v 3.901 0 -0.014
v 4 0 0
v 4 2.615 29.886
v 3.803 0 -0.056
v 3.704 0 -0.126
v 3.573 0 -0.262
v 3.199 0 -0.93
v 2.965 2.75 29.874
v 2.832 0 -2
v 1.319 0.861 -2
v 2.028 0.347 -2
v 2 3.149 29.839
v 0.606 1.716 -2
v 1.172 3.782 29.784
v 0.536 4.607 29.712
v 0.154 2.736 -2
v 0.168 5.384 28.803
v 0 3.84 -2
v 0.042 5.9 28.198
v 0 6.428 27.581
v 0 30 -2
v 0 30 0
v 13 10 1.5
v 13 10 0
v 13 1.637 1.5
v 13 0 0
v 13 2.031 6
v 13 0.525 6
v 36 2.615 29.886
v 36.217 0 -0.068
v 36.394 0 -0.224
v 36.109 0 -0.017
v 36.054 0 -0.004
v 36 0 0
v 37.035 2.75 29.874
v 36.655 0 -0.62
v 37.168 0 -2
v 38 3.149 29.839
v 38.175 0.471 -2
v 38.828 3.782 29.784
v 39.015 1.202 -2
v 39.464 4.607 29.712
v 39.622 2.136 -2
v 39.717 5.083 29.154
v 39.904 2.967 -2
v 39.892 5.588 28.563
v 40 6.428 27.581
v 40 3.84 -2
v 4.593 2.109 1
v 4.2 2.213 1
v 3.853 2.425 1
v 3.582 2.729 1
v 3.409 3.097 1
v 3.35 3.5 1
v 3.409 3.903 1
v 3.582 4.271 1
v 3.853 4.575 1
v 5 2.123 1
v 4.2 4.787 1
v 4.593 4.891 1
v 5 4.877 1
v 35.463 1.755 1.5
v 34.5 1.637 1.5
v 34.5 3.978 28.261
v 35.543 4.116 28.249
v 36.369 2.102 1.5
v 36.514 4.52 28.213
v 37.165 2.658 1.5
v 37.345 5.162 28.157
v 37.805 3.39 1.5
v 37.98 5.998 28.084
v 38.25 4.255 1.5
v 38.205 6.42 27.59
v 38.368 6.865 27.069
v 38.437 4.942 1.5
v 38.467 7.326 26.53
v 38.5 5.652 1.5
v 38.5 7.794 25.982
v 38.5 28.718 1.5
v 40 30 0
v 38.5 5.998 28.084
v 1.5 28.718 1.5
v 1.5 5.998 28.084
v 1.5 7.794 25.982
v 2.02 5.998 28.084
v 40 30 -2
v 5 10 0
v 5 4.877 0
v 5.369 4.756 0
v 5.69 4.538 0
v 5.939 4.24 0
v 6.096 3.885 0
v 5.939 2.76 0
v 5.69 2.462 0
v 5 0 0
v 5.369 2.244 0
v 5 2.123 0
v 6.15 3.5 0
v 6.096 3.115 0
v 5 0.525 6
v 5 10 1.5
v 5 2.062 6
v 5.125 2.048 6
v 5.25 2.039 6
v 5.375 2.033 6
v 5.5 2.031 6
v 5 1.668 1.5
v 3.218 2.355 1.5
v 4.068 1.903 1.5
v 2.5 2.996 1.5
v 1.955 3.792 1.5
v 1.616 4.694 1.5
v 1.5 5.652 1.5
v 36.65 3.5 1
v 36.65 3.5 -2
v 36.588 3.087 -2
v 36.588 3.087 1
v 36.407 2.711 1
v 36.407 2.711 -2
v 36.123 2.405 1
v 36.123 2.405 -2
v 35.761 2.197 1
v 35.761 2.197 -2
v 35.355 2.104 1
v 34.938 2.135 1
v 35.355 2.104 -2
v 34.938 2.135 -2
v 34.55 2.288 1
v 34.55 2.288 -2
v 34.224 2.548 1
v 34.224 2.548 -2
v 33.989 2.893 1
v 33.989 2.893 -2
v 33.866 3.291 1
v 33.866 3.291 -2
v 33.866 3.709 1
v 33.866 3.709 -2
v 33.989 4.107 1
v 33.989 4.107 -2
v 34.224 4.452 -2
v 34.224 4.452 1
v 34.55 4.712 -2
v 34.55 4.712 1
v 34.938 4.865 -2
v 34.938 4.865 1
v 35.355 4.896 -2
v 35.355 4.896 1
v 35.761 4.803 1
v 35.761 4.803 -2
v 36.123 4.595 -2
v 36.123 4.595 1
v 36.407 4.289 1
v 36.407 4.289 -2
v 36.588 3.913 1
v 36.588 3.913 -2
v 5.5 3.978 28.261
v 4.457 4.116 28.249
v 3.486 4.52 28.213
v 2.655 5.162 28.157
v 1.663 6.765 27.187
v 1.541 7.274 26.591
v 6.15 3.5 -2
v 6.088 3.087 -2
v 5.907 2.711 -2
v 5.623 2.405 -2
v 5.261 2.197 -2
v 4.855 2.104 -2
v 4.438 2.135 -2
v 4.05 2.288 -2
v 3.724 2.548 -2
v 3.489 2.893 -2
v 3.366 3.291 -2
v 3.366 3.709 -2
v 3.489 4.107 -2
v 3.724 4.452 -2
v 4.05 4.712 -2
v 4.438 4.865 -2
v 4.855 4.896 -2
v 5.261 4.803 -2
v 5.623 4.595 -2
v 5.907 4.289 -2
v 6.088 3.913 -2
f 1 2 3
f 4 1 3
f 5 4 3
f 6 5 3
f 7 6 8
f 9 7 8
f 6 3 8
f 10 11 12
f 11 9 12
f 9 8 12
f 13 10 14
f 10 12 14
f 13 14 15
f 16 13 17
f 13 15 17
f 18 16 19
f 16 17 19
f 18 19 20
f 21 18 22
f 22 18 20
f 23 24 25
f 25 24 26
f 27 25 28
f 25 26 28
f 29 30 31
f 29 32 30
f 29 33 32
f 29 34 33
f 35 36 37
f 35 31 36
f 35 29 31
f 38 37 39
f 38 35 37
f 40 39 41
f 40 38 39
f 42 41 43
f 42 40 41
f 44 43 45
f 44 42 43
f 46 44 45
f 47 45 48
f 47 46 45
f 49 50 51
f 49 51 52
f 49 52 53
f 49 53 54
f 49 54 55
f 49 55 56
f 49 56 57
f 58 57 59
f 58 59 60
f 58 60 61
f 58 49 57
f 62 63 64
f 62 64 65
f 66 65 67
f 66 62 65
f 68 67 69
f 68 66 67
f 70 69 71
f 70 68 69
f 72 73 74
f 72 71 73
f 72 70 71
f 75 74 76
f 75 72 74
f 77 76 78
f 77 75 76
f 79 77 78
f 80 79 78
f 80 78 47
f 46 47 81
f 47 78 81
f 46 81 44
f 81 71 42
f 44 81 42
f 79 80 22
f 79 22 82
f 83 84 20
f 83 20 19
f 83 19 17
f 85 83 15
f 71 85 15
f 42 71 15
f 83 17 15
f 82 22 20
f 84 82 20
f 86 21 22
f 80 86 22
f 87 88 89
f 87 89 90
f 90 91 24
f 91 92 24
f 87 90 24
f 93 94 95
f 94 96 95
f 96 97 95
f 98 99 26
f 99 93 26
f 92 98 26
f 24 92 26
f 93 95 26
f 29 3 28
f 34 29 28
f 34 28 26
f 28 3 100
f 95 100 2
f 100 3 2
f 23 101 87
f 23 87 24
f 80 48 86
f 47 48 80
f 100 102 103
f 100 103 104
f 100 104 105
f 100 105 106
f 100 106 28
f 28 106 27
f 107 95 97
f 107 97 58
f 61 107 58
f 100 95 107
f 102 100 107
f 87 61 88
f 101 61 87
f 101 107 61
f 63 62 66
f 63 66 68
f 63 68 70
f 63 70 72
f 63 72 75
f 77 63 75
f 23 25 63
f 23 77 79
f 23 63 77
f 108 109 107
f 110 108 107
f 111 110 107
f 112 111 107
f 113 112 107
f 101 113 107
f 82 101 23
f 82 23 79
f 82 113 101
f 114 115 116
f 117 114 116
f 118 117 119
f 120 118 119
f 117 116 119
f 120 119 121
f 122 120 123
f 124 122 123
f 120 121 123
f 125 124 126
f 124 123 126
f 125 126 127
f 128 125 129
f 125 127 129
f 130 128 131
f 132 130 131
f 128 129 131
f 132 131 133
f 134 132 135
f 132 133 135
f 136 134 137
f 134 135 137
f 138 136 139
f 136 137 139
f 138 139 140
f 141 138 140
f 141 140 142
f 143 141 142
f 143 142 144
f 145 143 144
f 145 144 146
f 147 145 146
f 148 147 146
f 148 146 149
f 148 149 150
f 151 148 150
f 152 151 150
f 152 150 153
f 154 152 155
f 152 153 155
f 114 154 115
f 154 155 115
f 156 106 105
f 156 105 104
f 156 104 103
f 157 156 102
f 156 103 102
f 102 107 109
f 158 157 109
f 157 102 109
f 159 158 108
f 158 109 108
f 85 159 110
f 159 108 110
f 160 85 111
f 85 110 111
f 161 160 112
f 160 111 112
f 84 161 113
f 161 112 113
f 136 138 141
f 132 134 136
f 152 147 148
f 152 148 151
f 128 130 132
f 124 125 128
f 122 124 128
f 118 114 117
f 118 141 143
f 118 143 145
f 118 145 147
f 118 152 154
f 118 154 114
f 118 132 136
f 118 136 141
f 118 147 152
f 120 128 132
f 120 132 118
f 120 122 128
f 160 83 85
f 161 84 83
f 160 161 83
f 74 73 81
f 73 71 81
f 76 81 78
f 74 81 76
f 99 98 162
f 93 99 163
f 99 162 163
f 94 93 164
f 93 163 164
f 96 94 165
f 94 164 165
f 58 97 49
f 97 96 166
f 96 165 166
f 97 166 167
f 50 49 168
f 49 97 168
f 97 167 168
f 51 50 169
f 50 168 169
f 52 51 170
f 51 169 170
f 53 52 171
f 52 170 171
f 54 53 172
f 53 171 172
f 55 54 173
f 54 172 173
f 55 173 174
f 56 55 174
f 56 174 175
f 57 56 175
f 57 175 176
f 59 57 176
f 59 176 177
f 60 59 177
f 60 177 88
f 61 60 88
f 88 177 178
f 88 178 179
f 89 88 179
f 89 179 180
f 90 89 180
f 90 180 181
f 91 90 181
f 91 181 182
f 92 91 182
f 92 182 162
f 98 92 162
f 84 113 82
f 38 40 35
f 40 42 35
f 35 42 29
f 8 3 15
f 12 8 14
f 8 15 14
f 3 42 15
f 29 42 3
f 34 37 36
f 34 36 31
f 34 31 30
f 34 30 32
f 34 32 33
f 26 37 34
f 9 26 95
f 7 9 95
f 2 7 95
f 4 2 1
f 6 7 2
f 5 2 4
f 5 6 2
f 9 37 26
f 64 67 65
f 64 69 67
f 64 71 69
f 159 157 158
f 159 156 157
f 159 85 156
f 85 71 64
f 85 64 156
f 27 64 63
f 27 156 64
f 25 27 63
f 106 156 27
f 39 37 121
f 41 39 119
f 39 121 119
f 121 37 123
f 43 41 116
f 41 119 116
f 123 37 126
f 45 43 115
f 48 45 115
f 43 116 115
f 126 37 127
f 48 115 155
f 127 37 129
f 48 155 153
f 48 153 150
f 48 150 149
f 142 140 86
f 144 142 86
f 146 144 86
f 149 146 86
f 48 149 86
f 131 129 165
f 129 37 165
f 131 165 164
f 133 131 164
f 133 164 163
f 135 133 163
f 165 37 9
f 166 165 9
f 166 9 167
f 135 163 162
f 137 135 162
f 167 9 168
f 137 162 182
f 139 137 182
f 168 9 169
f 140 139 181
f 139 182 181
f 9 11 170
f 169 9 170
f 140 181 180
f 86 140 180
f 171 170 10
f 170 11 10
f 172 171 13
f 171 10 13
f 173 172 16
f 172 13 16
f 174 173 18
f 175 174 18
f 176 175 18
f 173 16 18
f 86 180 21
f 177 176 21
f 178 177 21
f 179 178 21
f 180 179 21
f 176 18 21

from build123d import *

# Parameters (mm, degrees)
F1_DEPTH     = 40
F2_T         = -1.5
F0_W         = 30
F0_H         = 2
F3_DEPTH     = 40
F4_W         = 8
F4_H         = 6
F5_DEPTH     = 10
F6_R         = 1.4
F7_DEPTH     = 3
F8_T4_DEPTH  = 36.8630372484
F8_T11_DEPTH = 36.8630372484
F8_T17_DEPTH = 36.8630372484
F8_T20_DEPTH = 90


# Not quite as in the source:
# - a fillet or chamfer that OpenCascade refuses, or shapes differently, is made with other operations: its cross-section is extruded or revolved along the edge and cut away or added


with BuildPart() as f1:
    # F0 (on Right) → F1 (new body)
    with BuildSketch(Plane.YZ):
        Polygon((2.6146722824, 29.8858409428), (0, 0), (30, 0), (4.6070616786, 29.7115294573), align=None)
    extrude(amount=F1_DEPTH)

    # F2
    f2_openings = [f1.faces().sort_by_distance(p)[0] for p in [
        (20, 17.303531, 14.855765),
    ]]
    offset(amount=F2_T, openings=f2_openings)

    # F0 (on Right) → F3 (join)
    with BuildSketch(Plane.YZ):
        with Locations((15, -1)):
            Rectangle(F0_W, F0_H)
    extrude(amount=F3_DEPTH)

    # F4 (on Front) → F5 (cut)
    with BuildSketch(Plane.XZ):
        with Locations((9, 3)):
            Rectangle(F4_W, F4_H)
    extrude(amount=-F5_DEPTH, mode=Mode.SUBTRACT)

    # F6 (on face) → F7 (cut)
    with BuildSketch(Plane(origin=(0, 0, -2), x_dir=(1, 0, 0), z_dir=(0, 0, -1))):
        with Locations((4.75, -3.5)):
            Circle(F6_R)
        with Locations((35.25, -3.5)):
            Circle(F6_R)
    extrude(amount=-F7_DEPTH, mode=Mode.SUBTRACT)

    # F8: fillet of radius 4 on 4 edges, made by hand


with BuildPart() as f8_tool2:
    # F8_s3 → F8_t4 (new body)
    with BuildSketch(Plane(origin=(0, -0.728886723, -8.3312133668), x_dir=(1, 0, 0), z_dir=(0, 0.0871557427, 0.9961946981))):
        with BuildLine():
            ThreePointArc((5.5, 1.5), (2.6715728753, 2.6715728753), (1.5, 5.5))
            Line((1.5, 5.5), (1.5, 1.5))
            Line((1.5, 1.5), (5.5, 1.5))
        make_face()
    extrude(amount=F8_T4_DEPTH)

    split(bisect_by=Plane.YZ.offset(5), keep=Keep.BOTTOM)

    split(bisect_by=Plane(origin=(0, 17.3367768884, 14.8168645055), x_dir=(1, 0, 0), z_dir=(0, -0.7601924513, -0.6496979583)), keep=Keep.TOP)

    split(bisect_by=Plane.XY.offset(1.5), keep=Keep.TOP)


with BuildPart() as f1_1:
    add(f1.part)

    # F8_t1: union F8_tool2
    add(f8_tool2.part)


with BuildPart() as f8_tool9:
    # F8_s10 → F8_t11 (new body)
    with BuildSketch(Plane(origin=(0, -0.728886723, -8.3312133668), x_dir=(1, 0, 0), z_dir=(0, 0.0871557427, 0.9961946981))):
        with BuildLine():
            ThreePointArc((5.5, 1.5), (2.6715728753, 2.6715728753), (1.5, 5.5))
            Line((1.5, 5.5), (1.5, 1.5))
            Line((1.5, 1.5), (5.5, 1.5))
        make_face()
    extrude(amount=F8_T11_DEPTH)

    split(bisect_by=Plane.XY.offset(6), keep=Keep.TOP)

    split(bisect_by=Plane(origin=(0, 17.3367768884, 14.8168645055), x_dir=(1, 0, 0), z_dir=(0, -0.7601924513, -0.6496979583)), keep=Keep.TOP)


with BuildPart() as f1_2:
    add(f1_1.part)

    # F8_t8: union F8_tool9
    add(f8_tool9.part)


with BuildPart() as f8_tool15:
    # F8_s16 → F8_t17 (new body)
    with BuildSketch(Plane(origin=(0, -0.728886723, -8.3312133668), x_dir=(1, 0, 0), z_dir=(0, 0.0871557427, 0.9961946981))):
        with BuildLine():
            ThreePointArc((34.5, 1.5), (37.3284271247, 2.6715728753), (38.5, 5.5))
            Line((38.5, 5.5), (38.5, 1.5))
            Line((38.5, 1.5), (34.5, 1.5))
        make_face()
    extrude(amount=F8_T17_DEPTH)

    split(bisect_by=Plane(origin=(0, 17.3367768884, 14.8168645055), x_dir=(1, 0, 0), z_dir=(0, -0.7601924513, -0.6496979583)), keep=Keep.TOP)

    split(bisect_by=Plane.XY.offset(1.5), keep=Keep.TOP)


with BuildPart() as f1_3:
    add(f1_2.part)

    # F8_t14: union F8_tool15
    add(f8_tool15.part)

    # F8_s21 → F8_t20 (cut)
    with BuildSketch(Plane(origin=(0, 3.4862297099, 39.8477879237), x_dir=(1, 0, 0), z_dir=(0, -0.0871557427, -0.9961946981))):
        with BuildLine():
            ThreePointArc((4, 0), (1.1715728753, -1.1715728753), (0, -4))
            Line((0, -4), (0, 0))
            Line((0, 0), (4, 0))
        make_face()
        with BuildLine():
            ThreePointArc((36, 0), (38.8284271247, -1.1715728753), (40, -4))
            Line((40, -4), (40, 0))
            Line((40, 0), (36, 0))
        make_face()
    extrude(amount=F8_T20_DEPTH, mode=Mode.SUBTRACT)


solid = f1_3.part
